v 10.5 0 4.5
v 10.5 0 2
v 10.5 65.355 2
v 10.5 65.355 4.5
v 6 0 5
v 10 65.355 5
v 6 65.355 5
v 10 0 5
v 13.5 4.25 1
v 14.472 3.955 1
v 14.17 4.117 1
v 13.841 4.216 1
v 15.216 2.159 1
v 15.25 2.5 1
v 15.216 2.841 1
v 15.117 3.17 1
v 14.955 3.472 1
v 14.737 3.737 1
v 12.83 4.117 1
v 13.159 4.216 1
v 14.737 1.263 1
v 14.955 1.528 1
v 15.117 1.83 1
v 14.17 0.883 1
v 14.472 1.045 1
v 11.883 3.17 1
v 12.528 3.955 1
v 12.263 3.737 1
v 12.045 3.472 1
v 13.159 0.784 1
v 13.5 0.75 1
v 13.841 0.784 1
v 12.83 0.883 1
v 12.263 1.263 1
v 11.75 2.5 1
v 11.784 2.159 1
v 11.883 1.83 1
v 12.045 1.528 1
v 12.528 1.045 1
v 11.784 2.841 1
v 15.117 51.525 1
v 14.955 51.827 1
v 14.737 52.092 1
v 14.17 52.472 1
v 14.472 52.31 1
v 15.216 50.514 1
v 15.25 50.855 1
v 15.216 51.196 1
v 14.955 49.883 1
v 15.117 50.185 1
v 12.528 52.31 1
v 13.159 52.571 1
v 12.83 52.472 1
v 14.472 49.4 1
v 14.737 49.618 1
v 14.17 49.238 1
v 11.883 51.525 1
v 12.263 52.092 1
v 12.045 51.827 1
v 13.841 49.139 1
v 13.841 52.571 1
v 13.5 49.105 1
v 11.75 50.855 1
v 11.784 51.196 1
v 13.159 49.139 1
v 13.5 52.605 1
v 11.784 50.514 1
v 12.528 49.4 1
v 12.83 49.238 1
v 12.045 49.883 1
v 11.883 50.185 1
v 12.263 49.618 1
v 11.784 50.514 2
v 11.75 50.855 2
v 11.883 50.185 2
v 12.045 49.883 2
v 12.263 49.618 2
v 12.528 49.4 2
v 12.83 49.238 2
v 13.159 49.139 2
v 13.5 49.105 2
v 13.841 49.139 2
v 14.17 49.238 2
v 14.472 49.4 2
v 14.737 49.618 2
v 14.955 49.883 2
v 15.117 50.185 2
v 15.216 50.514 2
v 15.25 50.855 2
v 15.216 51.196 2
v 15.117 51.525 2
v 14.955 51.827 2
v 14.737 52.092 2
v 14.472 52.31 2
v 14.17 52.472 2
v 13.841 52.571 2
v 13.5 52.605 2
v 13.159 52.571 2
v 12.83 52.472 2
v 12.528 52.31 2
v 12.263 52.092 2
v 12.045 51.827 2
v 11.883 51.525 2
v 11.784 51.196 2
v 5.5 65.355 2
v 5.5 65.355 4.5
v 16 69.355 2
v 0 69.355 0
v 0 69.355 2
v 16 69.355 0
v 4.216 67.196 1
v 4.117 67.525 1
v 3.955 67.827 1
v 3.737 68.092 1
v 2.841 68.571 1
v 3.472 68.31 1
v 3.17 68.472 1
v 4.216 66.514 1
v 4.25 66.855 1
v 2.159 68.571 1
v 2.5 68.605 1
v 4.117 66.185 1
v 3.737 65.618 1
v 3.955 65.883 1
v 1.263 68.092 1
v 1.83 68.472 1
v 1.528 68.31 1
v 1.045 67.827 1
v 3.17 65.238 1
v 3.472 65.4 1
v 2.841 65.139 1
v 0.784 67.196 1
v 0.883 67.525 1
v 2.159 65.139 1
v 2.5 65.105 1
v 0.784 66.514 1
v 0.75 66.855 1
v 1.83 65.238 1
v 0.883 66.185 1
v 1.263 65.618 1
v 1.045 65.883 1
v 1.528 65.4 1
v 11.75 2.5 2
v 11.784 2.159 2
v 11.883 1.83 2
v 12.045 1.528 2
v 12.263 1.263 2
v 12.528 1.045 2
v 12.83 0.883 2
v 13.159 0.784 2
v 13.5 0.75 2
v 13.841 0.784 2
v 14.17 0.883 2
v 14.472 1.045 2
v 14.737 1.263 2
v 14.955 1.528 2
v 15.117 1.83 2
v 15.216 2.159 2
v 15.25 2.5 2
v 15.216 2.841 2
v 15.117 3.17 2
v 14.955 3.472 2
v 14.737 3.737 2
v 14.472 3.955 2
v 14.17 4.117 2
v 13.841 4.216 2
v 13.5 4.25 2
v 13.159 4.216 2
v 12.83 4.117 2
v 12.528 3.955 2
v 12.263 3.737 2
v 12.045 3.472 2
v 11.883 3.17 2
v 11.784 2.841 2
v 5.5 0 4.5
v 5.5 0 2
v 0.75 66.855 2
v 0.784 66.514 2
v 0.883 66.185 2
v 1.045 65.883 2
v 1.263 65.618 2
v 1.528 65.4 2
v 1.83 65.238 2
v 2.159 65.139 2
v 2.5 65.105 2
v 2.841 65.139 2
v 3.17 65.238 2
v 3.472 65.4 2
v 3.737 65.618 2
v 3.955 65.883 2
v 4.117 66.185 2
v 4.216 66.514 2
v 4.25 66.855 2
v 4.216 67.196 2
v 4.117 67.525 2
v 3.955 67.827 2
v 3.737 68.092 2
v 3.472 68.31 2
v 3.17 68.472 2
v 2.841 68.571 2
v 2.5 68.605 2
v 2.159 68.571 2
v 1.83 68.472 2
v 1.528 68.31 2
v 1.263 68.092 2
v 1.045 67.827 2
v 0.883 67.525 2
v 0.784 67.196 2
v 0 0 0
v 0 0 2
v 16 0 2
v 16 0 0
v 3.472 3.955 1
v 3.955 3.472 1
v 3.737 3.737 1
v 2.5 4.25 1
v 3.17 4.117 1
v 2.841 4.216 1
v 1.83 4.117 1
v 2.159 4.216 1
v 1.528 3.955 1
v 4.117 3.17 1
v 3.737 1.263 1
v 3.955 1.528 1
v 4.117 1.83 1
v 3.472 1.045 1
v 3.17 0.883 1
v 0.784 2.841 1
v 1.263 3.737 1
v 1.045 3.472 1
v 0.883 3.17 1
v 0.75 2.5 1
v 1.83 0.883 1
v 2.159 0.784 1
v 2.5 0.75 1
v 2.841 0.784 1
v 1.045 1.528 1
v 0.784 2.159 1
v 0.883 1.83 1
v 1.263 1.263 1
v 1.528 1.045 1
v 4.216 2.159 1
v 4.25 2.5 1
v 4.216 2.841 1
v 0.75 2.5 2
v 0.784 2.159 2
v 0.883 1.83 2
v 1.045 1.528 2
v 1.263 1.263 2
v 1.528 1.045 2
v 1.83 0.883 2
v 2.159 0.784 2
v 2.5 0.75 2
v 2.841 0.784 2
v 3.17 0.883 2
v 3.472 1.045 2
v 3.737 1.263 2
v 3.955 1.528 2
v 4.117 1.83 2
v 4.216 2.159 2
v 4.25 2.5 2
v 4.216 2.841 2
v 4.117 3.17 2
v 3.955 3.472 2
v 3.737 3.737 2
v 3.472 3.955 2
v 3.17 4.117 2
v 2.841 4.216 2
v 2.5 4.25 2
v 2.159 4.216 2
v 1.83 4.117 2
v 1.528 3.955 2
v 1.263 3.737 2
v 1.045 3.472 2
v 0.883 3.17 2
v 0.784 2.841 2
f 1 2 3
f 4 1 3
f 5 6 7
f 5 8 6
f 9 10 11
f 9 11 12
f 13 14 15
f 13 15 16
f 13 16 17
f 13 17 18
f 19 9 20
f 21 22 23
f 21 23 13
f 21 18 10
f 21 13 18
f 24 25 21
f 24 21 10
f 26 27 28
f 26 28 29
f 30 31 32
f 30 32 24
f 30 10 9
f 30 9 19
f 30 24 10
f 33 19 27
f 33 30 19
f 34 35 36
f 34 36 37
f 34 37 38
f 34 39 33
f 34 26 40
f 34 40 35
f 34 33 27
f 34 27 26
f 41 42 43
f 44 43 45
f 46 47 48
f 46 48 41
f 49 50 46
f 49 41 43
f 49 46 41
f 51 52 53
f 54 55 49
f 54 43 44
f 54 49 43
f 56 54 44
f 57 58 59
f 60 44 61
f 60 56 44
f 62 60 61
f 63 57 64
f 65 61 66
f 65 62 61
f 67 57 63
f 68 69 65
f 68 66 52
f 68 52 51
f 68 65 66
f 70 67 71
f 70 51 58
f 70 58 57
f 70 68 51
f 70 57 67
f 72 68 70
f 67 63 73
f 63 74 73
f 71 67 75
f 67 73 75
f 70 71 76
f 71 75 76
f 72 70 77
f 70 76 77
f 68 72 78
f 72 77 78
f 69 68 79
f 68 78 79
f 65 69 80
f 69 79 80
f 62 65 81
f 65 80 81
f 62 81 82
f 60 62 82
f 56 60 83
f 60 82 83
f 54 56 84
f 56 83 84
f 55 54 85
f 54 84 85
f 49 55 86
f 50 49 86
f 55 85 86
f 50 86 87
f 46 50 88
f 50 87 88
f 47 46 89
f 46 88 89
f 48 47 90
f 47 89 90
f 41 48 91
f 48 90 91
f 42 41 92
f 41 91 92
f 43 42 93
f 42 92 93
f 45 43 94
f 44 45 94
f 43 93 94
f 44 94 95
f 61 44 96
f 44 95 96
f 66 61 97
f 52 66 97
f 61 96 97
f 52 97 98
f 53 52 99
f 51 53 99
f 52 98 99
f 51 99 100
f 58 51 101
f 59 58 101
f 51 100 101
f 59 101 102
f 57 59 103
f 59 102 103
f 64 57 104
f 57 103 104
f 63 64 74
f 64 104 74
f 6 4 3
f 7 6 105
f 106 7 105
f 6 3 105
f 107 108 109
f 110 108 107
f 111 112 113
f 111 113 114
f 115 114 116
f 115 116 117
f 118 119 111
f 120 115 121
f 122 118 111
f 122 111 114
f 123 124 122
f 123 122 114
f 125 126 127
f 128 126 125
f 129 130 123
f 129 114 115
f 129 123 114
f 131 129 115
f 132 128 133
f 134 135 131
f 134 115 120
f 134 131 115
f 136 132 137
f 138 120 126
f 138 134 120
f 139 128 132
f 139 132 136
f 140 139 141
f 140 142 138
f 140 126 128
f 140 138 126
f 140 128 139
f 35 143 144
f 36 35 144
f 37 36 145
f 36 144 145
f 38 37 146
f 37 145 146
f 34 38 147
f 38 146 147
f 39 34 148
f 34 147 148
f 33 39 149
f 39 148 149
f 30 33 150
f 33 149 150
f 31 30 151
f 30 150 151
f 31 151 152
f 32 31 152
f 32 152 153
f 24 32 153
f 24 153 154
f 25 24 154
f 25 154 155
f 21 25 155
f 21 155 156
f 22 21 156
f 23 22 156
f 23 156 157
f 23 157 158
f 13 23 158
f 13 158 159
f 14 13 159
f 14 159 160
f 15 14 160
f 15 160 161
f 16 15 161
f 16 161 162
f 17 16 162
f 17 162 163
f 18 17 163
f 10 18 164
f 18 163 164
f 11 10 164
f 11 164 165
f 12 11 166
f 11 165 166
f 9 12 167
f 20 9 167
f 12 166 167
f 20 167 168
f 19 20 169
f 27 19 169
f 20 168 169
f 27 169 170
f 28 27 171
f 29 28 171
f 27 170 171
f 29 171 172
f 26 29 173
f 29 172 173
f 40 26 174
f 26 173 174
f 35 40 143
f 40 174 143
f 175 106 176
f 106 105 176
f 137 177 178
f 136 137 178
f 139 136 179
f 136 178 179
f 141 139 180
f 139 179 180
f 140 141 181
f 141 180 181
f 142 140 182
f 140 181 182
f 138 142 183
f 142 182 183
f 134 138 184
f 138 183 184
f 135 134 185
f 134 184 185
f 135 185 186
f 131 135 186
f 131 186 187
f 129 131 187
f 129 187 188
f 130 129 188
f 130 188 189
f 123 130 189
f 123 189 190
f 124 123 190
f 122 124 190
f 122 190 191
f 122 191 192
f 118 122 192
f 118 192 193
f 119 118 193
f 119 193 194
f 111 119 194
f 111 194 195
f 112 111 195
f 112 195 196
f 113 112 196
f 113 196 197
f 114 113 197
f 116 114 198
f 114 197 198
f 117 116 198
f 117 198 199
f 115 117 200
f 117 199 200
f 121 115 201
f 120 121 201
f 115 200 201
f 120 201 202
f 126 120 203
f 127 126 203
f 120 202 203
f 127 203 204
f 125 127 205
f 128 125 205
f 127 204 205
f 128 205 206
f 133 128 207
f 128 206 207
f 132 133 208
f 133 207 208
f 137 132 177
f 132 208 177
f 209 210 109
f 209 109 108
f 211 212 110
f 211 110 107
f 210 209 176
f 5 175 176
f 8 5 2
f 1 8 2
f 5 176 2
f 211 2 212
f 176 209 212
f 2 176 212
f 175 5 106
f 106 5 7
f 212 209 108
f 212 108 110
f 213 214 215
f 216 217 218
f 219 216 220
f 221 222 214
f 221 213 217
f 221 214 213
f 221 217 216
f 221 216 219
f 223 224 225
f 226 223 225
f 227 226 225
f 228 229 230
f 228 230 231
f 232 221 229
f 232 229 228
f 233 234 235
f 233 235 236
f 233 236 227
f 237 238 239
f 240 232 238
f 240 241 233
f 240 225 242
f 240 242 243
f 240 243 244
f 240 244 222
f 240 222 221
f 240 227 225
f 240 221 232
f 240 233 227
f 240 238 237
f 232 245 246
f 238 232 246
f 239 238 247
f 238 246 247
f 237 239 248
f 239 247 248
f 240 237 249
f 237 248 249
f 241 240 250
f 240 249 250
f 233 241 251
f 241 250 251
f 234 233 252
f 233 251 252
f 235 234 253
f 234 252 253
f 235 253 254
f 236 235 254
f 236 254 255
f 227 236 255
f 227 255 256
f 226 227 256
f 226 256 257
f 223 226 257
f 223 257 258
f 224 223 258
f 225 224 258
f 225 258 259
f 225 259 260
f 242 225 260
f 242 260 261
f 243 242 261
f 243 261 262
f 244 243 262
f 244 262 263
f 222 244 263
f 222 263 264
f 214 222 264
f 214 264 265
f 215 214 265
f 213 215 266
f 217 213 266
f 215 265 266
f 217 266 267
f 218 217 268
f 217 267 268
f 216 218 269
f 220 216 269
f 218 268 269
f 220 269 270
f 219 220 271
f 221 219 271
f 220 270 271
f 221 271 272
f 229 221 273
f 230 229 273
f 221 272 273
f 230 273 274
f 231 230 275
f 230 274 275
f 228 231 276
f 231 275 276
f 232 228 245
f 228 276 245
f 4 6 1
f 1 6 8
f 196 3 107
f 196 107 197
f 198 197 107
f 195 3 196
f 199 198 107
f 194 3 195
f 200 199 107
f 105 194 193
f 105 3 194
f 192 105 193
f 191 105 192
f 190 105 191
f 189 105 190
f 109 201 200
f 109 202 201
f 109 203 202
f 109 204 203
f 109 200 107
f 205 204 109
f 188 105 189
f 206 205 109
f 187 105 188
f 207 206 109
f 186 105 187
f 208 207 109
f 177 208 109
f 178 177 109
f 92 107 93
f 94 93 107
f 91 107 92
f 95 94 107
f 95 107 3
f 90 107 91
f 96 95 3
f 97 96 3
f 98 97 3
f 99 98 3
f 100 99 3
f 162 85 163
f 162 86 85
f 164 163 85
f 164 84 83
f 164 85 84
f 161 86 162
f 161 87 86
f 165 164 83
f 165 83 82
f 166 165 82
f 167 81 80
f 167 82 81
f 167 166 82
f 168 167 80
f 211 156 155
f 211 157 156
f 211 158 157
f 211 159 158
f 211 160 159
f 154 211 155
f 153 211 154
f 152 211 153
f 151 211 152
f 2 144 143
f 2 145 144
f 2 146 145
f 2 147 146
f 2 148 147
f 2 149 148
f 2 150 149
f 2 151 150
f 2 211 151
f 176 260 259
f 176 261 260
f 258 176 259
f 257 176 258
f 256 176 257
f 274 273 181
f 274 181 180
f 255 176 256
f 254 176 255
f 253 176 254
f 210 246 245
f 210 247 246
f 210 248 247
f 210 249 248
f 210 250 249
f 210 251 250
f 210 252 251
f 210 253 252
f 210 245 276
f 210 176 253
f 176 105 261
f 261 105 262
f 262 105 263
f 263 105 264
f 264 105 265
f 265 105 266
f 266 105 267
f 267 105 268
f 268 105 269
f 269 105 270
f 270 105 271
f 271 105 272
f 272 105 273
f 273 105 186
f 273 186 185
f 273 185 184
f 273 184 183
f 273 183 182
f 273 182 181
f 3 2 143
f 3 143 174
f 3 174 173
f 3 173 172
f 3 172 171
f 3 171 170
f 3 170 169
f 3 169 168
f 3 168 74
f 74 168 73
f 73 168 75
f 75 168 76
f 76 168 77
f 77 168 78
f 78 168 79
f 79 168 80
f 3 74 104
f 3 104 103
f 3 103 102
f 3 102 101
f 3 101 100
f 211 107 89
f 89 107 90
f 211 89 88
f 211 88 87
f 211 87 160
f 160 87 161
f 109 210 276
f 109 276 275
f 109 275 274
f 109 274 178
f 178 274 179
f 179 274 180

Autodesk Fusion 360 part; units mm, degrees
sketch "3D-printed conduit top outline" plane through (0, 0, 0) normal (0, 1, 0) x (1, 0, 0)
  line L0 (0, 0) -> (16, 0)
  line L1 (16, 0) -> (16, -2)
  line L2 (16, -2) -> (0, -2)
  line L3 (0, -2) -> (0, 0)
  dimension "d7" = 16
  dimension "d8" = 2
extrude "Extrude1" add sketch "3D-printed conduit top outline" along normal blind 69.355
sketch "Magnet holes" plane through (0, 0, 2) normal (0, 0, 1) x (-1, 0, 0)
  line L0 (0, 0) -> (-16, 0)
  line L1 (-16, 0) -> (-16, -69.355)
  line L2 (-16, -69.355) -> (0, -69.355)
  line L3 (0, -69.355) -> (0, 0)
  circle A0 centre (-2.5, -2.5) radius 2.5
  circle A1 centre (-13.5, -2.5) radius 2.5
  circle A2 centre (-2.5, -2.5) radius 1.75
  circle A3 centre (-13.5, -2.5) radius 1.75
  circle A4 centre (-2.5, -66.855) radius 1.75
  circle A5 centre (-2.5, -66.855) radius 2.5
  circle A6 centre (-13.5, -50.855) radius 2.5
  circle A7 centre (-13.5, -50.855) radius 1.75
  dimension "d11" = 5
  dimension "d12" = 5
  dimension "d13" = 3.5
  dimension "d14" = 3.5
  dimension "d17" = 0
  dimension "d18" = -64.355
  dimension "d32" = 0
  dimension "d33" = -48.355
extrude "Extrude4" cut sketch "Magnet holes" against normal blind 1 contours A2 | A3 | A4 | A7
sketch "Support rib" plane through (0, 0, 2) normal (0, 0, 1) x (-1, 0, 0)
  circle A0 centre (-13.5, -2.5) radius 1.75
  circle A1 centre (-2.5, -66.855) radius 1.75
  circle A2 centre (-2.5, -2.5) radius 1.75
  circle A3 centre (-13.5, -50.855) radius 1.75
  line L0 (0, 0) -> (-16, 0)
  line L1 (-16, 0) -> (-16, -69.355)
  line L2 (-16, -69.355) -> (0, -69.355)
  line L3 (0, -69.355) -> (0, 0)
  line L4 (-5.5, 0) -> (-10.5, 0)
  line L5 (-10.5, 0) -> (-10.5, -65.355)
  line L6 (-10.5, -65.355) -> (-5.5, -65.355)
  line L7 (-5.5, -65.355) -> (-5.5, 0)
  dimension "d36" = 5
  dimension "d37" = 5.5
  dimension "d38" = 5.5
  dimension "d39" = 4
extrude "Extrude3" add sketch "Support rib" along normal blind 3 contours L0 L4 L5 L6 L7
chamfer "Chamfer2" distance 0.5 angle 45 2 edges at (10.5, 32.6775, 5) (5.5, 32.6775, 5)
equation "conduit_length = 69.355 mm"
equation "conduit_width = 16 mm"
equation "conduit_wall_thickness = 2 mm"
equation "magnet_diameter = 3 mm"
equation "magnet_height = 1 mm"
equation "number_of_magnets_on_a_side = 2"
equation "d7 = conduit_width"
equation "d8 = conduit_wall_thickness"
equation "d9 = conduit_length"
equation "d11 = magnet_diameter + 2 mm"
equation "d12 = magnet_diameter + 2 mm"
equation "d13 = magnet_diameter + 0.5 mm"
equation "d14 = magnet_diameter + 0.5 mm"
equation "d16 = number_of_magnets_on_a_side"
equation "d18 = -conduit_length + ( magnet_diameter + 2 mm )"
equation "rib_width = 5 mm"
equation "rib_height = 3 mm"
equation "d26 = rib_height"
equation "rib_chamfer = 0.5 mm"
equation "d31 = number_of_magnets_on_a_side"
equation "d33 = -conduit_length + ( magnet_diameter + 2 mm ) + ( conduit_width )"
equation "d34 = -magnet_height"
equation "d36 = rib_width"
equation "d37 = ( conduit_width - rib_width ) / 2"
equation "d39 = 2 * conduit_wall_thickness"
equation "d40 = rib_chamfer"
